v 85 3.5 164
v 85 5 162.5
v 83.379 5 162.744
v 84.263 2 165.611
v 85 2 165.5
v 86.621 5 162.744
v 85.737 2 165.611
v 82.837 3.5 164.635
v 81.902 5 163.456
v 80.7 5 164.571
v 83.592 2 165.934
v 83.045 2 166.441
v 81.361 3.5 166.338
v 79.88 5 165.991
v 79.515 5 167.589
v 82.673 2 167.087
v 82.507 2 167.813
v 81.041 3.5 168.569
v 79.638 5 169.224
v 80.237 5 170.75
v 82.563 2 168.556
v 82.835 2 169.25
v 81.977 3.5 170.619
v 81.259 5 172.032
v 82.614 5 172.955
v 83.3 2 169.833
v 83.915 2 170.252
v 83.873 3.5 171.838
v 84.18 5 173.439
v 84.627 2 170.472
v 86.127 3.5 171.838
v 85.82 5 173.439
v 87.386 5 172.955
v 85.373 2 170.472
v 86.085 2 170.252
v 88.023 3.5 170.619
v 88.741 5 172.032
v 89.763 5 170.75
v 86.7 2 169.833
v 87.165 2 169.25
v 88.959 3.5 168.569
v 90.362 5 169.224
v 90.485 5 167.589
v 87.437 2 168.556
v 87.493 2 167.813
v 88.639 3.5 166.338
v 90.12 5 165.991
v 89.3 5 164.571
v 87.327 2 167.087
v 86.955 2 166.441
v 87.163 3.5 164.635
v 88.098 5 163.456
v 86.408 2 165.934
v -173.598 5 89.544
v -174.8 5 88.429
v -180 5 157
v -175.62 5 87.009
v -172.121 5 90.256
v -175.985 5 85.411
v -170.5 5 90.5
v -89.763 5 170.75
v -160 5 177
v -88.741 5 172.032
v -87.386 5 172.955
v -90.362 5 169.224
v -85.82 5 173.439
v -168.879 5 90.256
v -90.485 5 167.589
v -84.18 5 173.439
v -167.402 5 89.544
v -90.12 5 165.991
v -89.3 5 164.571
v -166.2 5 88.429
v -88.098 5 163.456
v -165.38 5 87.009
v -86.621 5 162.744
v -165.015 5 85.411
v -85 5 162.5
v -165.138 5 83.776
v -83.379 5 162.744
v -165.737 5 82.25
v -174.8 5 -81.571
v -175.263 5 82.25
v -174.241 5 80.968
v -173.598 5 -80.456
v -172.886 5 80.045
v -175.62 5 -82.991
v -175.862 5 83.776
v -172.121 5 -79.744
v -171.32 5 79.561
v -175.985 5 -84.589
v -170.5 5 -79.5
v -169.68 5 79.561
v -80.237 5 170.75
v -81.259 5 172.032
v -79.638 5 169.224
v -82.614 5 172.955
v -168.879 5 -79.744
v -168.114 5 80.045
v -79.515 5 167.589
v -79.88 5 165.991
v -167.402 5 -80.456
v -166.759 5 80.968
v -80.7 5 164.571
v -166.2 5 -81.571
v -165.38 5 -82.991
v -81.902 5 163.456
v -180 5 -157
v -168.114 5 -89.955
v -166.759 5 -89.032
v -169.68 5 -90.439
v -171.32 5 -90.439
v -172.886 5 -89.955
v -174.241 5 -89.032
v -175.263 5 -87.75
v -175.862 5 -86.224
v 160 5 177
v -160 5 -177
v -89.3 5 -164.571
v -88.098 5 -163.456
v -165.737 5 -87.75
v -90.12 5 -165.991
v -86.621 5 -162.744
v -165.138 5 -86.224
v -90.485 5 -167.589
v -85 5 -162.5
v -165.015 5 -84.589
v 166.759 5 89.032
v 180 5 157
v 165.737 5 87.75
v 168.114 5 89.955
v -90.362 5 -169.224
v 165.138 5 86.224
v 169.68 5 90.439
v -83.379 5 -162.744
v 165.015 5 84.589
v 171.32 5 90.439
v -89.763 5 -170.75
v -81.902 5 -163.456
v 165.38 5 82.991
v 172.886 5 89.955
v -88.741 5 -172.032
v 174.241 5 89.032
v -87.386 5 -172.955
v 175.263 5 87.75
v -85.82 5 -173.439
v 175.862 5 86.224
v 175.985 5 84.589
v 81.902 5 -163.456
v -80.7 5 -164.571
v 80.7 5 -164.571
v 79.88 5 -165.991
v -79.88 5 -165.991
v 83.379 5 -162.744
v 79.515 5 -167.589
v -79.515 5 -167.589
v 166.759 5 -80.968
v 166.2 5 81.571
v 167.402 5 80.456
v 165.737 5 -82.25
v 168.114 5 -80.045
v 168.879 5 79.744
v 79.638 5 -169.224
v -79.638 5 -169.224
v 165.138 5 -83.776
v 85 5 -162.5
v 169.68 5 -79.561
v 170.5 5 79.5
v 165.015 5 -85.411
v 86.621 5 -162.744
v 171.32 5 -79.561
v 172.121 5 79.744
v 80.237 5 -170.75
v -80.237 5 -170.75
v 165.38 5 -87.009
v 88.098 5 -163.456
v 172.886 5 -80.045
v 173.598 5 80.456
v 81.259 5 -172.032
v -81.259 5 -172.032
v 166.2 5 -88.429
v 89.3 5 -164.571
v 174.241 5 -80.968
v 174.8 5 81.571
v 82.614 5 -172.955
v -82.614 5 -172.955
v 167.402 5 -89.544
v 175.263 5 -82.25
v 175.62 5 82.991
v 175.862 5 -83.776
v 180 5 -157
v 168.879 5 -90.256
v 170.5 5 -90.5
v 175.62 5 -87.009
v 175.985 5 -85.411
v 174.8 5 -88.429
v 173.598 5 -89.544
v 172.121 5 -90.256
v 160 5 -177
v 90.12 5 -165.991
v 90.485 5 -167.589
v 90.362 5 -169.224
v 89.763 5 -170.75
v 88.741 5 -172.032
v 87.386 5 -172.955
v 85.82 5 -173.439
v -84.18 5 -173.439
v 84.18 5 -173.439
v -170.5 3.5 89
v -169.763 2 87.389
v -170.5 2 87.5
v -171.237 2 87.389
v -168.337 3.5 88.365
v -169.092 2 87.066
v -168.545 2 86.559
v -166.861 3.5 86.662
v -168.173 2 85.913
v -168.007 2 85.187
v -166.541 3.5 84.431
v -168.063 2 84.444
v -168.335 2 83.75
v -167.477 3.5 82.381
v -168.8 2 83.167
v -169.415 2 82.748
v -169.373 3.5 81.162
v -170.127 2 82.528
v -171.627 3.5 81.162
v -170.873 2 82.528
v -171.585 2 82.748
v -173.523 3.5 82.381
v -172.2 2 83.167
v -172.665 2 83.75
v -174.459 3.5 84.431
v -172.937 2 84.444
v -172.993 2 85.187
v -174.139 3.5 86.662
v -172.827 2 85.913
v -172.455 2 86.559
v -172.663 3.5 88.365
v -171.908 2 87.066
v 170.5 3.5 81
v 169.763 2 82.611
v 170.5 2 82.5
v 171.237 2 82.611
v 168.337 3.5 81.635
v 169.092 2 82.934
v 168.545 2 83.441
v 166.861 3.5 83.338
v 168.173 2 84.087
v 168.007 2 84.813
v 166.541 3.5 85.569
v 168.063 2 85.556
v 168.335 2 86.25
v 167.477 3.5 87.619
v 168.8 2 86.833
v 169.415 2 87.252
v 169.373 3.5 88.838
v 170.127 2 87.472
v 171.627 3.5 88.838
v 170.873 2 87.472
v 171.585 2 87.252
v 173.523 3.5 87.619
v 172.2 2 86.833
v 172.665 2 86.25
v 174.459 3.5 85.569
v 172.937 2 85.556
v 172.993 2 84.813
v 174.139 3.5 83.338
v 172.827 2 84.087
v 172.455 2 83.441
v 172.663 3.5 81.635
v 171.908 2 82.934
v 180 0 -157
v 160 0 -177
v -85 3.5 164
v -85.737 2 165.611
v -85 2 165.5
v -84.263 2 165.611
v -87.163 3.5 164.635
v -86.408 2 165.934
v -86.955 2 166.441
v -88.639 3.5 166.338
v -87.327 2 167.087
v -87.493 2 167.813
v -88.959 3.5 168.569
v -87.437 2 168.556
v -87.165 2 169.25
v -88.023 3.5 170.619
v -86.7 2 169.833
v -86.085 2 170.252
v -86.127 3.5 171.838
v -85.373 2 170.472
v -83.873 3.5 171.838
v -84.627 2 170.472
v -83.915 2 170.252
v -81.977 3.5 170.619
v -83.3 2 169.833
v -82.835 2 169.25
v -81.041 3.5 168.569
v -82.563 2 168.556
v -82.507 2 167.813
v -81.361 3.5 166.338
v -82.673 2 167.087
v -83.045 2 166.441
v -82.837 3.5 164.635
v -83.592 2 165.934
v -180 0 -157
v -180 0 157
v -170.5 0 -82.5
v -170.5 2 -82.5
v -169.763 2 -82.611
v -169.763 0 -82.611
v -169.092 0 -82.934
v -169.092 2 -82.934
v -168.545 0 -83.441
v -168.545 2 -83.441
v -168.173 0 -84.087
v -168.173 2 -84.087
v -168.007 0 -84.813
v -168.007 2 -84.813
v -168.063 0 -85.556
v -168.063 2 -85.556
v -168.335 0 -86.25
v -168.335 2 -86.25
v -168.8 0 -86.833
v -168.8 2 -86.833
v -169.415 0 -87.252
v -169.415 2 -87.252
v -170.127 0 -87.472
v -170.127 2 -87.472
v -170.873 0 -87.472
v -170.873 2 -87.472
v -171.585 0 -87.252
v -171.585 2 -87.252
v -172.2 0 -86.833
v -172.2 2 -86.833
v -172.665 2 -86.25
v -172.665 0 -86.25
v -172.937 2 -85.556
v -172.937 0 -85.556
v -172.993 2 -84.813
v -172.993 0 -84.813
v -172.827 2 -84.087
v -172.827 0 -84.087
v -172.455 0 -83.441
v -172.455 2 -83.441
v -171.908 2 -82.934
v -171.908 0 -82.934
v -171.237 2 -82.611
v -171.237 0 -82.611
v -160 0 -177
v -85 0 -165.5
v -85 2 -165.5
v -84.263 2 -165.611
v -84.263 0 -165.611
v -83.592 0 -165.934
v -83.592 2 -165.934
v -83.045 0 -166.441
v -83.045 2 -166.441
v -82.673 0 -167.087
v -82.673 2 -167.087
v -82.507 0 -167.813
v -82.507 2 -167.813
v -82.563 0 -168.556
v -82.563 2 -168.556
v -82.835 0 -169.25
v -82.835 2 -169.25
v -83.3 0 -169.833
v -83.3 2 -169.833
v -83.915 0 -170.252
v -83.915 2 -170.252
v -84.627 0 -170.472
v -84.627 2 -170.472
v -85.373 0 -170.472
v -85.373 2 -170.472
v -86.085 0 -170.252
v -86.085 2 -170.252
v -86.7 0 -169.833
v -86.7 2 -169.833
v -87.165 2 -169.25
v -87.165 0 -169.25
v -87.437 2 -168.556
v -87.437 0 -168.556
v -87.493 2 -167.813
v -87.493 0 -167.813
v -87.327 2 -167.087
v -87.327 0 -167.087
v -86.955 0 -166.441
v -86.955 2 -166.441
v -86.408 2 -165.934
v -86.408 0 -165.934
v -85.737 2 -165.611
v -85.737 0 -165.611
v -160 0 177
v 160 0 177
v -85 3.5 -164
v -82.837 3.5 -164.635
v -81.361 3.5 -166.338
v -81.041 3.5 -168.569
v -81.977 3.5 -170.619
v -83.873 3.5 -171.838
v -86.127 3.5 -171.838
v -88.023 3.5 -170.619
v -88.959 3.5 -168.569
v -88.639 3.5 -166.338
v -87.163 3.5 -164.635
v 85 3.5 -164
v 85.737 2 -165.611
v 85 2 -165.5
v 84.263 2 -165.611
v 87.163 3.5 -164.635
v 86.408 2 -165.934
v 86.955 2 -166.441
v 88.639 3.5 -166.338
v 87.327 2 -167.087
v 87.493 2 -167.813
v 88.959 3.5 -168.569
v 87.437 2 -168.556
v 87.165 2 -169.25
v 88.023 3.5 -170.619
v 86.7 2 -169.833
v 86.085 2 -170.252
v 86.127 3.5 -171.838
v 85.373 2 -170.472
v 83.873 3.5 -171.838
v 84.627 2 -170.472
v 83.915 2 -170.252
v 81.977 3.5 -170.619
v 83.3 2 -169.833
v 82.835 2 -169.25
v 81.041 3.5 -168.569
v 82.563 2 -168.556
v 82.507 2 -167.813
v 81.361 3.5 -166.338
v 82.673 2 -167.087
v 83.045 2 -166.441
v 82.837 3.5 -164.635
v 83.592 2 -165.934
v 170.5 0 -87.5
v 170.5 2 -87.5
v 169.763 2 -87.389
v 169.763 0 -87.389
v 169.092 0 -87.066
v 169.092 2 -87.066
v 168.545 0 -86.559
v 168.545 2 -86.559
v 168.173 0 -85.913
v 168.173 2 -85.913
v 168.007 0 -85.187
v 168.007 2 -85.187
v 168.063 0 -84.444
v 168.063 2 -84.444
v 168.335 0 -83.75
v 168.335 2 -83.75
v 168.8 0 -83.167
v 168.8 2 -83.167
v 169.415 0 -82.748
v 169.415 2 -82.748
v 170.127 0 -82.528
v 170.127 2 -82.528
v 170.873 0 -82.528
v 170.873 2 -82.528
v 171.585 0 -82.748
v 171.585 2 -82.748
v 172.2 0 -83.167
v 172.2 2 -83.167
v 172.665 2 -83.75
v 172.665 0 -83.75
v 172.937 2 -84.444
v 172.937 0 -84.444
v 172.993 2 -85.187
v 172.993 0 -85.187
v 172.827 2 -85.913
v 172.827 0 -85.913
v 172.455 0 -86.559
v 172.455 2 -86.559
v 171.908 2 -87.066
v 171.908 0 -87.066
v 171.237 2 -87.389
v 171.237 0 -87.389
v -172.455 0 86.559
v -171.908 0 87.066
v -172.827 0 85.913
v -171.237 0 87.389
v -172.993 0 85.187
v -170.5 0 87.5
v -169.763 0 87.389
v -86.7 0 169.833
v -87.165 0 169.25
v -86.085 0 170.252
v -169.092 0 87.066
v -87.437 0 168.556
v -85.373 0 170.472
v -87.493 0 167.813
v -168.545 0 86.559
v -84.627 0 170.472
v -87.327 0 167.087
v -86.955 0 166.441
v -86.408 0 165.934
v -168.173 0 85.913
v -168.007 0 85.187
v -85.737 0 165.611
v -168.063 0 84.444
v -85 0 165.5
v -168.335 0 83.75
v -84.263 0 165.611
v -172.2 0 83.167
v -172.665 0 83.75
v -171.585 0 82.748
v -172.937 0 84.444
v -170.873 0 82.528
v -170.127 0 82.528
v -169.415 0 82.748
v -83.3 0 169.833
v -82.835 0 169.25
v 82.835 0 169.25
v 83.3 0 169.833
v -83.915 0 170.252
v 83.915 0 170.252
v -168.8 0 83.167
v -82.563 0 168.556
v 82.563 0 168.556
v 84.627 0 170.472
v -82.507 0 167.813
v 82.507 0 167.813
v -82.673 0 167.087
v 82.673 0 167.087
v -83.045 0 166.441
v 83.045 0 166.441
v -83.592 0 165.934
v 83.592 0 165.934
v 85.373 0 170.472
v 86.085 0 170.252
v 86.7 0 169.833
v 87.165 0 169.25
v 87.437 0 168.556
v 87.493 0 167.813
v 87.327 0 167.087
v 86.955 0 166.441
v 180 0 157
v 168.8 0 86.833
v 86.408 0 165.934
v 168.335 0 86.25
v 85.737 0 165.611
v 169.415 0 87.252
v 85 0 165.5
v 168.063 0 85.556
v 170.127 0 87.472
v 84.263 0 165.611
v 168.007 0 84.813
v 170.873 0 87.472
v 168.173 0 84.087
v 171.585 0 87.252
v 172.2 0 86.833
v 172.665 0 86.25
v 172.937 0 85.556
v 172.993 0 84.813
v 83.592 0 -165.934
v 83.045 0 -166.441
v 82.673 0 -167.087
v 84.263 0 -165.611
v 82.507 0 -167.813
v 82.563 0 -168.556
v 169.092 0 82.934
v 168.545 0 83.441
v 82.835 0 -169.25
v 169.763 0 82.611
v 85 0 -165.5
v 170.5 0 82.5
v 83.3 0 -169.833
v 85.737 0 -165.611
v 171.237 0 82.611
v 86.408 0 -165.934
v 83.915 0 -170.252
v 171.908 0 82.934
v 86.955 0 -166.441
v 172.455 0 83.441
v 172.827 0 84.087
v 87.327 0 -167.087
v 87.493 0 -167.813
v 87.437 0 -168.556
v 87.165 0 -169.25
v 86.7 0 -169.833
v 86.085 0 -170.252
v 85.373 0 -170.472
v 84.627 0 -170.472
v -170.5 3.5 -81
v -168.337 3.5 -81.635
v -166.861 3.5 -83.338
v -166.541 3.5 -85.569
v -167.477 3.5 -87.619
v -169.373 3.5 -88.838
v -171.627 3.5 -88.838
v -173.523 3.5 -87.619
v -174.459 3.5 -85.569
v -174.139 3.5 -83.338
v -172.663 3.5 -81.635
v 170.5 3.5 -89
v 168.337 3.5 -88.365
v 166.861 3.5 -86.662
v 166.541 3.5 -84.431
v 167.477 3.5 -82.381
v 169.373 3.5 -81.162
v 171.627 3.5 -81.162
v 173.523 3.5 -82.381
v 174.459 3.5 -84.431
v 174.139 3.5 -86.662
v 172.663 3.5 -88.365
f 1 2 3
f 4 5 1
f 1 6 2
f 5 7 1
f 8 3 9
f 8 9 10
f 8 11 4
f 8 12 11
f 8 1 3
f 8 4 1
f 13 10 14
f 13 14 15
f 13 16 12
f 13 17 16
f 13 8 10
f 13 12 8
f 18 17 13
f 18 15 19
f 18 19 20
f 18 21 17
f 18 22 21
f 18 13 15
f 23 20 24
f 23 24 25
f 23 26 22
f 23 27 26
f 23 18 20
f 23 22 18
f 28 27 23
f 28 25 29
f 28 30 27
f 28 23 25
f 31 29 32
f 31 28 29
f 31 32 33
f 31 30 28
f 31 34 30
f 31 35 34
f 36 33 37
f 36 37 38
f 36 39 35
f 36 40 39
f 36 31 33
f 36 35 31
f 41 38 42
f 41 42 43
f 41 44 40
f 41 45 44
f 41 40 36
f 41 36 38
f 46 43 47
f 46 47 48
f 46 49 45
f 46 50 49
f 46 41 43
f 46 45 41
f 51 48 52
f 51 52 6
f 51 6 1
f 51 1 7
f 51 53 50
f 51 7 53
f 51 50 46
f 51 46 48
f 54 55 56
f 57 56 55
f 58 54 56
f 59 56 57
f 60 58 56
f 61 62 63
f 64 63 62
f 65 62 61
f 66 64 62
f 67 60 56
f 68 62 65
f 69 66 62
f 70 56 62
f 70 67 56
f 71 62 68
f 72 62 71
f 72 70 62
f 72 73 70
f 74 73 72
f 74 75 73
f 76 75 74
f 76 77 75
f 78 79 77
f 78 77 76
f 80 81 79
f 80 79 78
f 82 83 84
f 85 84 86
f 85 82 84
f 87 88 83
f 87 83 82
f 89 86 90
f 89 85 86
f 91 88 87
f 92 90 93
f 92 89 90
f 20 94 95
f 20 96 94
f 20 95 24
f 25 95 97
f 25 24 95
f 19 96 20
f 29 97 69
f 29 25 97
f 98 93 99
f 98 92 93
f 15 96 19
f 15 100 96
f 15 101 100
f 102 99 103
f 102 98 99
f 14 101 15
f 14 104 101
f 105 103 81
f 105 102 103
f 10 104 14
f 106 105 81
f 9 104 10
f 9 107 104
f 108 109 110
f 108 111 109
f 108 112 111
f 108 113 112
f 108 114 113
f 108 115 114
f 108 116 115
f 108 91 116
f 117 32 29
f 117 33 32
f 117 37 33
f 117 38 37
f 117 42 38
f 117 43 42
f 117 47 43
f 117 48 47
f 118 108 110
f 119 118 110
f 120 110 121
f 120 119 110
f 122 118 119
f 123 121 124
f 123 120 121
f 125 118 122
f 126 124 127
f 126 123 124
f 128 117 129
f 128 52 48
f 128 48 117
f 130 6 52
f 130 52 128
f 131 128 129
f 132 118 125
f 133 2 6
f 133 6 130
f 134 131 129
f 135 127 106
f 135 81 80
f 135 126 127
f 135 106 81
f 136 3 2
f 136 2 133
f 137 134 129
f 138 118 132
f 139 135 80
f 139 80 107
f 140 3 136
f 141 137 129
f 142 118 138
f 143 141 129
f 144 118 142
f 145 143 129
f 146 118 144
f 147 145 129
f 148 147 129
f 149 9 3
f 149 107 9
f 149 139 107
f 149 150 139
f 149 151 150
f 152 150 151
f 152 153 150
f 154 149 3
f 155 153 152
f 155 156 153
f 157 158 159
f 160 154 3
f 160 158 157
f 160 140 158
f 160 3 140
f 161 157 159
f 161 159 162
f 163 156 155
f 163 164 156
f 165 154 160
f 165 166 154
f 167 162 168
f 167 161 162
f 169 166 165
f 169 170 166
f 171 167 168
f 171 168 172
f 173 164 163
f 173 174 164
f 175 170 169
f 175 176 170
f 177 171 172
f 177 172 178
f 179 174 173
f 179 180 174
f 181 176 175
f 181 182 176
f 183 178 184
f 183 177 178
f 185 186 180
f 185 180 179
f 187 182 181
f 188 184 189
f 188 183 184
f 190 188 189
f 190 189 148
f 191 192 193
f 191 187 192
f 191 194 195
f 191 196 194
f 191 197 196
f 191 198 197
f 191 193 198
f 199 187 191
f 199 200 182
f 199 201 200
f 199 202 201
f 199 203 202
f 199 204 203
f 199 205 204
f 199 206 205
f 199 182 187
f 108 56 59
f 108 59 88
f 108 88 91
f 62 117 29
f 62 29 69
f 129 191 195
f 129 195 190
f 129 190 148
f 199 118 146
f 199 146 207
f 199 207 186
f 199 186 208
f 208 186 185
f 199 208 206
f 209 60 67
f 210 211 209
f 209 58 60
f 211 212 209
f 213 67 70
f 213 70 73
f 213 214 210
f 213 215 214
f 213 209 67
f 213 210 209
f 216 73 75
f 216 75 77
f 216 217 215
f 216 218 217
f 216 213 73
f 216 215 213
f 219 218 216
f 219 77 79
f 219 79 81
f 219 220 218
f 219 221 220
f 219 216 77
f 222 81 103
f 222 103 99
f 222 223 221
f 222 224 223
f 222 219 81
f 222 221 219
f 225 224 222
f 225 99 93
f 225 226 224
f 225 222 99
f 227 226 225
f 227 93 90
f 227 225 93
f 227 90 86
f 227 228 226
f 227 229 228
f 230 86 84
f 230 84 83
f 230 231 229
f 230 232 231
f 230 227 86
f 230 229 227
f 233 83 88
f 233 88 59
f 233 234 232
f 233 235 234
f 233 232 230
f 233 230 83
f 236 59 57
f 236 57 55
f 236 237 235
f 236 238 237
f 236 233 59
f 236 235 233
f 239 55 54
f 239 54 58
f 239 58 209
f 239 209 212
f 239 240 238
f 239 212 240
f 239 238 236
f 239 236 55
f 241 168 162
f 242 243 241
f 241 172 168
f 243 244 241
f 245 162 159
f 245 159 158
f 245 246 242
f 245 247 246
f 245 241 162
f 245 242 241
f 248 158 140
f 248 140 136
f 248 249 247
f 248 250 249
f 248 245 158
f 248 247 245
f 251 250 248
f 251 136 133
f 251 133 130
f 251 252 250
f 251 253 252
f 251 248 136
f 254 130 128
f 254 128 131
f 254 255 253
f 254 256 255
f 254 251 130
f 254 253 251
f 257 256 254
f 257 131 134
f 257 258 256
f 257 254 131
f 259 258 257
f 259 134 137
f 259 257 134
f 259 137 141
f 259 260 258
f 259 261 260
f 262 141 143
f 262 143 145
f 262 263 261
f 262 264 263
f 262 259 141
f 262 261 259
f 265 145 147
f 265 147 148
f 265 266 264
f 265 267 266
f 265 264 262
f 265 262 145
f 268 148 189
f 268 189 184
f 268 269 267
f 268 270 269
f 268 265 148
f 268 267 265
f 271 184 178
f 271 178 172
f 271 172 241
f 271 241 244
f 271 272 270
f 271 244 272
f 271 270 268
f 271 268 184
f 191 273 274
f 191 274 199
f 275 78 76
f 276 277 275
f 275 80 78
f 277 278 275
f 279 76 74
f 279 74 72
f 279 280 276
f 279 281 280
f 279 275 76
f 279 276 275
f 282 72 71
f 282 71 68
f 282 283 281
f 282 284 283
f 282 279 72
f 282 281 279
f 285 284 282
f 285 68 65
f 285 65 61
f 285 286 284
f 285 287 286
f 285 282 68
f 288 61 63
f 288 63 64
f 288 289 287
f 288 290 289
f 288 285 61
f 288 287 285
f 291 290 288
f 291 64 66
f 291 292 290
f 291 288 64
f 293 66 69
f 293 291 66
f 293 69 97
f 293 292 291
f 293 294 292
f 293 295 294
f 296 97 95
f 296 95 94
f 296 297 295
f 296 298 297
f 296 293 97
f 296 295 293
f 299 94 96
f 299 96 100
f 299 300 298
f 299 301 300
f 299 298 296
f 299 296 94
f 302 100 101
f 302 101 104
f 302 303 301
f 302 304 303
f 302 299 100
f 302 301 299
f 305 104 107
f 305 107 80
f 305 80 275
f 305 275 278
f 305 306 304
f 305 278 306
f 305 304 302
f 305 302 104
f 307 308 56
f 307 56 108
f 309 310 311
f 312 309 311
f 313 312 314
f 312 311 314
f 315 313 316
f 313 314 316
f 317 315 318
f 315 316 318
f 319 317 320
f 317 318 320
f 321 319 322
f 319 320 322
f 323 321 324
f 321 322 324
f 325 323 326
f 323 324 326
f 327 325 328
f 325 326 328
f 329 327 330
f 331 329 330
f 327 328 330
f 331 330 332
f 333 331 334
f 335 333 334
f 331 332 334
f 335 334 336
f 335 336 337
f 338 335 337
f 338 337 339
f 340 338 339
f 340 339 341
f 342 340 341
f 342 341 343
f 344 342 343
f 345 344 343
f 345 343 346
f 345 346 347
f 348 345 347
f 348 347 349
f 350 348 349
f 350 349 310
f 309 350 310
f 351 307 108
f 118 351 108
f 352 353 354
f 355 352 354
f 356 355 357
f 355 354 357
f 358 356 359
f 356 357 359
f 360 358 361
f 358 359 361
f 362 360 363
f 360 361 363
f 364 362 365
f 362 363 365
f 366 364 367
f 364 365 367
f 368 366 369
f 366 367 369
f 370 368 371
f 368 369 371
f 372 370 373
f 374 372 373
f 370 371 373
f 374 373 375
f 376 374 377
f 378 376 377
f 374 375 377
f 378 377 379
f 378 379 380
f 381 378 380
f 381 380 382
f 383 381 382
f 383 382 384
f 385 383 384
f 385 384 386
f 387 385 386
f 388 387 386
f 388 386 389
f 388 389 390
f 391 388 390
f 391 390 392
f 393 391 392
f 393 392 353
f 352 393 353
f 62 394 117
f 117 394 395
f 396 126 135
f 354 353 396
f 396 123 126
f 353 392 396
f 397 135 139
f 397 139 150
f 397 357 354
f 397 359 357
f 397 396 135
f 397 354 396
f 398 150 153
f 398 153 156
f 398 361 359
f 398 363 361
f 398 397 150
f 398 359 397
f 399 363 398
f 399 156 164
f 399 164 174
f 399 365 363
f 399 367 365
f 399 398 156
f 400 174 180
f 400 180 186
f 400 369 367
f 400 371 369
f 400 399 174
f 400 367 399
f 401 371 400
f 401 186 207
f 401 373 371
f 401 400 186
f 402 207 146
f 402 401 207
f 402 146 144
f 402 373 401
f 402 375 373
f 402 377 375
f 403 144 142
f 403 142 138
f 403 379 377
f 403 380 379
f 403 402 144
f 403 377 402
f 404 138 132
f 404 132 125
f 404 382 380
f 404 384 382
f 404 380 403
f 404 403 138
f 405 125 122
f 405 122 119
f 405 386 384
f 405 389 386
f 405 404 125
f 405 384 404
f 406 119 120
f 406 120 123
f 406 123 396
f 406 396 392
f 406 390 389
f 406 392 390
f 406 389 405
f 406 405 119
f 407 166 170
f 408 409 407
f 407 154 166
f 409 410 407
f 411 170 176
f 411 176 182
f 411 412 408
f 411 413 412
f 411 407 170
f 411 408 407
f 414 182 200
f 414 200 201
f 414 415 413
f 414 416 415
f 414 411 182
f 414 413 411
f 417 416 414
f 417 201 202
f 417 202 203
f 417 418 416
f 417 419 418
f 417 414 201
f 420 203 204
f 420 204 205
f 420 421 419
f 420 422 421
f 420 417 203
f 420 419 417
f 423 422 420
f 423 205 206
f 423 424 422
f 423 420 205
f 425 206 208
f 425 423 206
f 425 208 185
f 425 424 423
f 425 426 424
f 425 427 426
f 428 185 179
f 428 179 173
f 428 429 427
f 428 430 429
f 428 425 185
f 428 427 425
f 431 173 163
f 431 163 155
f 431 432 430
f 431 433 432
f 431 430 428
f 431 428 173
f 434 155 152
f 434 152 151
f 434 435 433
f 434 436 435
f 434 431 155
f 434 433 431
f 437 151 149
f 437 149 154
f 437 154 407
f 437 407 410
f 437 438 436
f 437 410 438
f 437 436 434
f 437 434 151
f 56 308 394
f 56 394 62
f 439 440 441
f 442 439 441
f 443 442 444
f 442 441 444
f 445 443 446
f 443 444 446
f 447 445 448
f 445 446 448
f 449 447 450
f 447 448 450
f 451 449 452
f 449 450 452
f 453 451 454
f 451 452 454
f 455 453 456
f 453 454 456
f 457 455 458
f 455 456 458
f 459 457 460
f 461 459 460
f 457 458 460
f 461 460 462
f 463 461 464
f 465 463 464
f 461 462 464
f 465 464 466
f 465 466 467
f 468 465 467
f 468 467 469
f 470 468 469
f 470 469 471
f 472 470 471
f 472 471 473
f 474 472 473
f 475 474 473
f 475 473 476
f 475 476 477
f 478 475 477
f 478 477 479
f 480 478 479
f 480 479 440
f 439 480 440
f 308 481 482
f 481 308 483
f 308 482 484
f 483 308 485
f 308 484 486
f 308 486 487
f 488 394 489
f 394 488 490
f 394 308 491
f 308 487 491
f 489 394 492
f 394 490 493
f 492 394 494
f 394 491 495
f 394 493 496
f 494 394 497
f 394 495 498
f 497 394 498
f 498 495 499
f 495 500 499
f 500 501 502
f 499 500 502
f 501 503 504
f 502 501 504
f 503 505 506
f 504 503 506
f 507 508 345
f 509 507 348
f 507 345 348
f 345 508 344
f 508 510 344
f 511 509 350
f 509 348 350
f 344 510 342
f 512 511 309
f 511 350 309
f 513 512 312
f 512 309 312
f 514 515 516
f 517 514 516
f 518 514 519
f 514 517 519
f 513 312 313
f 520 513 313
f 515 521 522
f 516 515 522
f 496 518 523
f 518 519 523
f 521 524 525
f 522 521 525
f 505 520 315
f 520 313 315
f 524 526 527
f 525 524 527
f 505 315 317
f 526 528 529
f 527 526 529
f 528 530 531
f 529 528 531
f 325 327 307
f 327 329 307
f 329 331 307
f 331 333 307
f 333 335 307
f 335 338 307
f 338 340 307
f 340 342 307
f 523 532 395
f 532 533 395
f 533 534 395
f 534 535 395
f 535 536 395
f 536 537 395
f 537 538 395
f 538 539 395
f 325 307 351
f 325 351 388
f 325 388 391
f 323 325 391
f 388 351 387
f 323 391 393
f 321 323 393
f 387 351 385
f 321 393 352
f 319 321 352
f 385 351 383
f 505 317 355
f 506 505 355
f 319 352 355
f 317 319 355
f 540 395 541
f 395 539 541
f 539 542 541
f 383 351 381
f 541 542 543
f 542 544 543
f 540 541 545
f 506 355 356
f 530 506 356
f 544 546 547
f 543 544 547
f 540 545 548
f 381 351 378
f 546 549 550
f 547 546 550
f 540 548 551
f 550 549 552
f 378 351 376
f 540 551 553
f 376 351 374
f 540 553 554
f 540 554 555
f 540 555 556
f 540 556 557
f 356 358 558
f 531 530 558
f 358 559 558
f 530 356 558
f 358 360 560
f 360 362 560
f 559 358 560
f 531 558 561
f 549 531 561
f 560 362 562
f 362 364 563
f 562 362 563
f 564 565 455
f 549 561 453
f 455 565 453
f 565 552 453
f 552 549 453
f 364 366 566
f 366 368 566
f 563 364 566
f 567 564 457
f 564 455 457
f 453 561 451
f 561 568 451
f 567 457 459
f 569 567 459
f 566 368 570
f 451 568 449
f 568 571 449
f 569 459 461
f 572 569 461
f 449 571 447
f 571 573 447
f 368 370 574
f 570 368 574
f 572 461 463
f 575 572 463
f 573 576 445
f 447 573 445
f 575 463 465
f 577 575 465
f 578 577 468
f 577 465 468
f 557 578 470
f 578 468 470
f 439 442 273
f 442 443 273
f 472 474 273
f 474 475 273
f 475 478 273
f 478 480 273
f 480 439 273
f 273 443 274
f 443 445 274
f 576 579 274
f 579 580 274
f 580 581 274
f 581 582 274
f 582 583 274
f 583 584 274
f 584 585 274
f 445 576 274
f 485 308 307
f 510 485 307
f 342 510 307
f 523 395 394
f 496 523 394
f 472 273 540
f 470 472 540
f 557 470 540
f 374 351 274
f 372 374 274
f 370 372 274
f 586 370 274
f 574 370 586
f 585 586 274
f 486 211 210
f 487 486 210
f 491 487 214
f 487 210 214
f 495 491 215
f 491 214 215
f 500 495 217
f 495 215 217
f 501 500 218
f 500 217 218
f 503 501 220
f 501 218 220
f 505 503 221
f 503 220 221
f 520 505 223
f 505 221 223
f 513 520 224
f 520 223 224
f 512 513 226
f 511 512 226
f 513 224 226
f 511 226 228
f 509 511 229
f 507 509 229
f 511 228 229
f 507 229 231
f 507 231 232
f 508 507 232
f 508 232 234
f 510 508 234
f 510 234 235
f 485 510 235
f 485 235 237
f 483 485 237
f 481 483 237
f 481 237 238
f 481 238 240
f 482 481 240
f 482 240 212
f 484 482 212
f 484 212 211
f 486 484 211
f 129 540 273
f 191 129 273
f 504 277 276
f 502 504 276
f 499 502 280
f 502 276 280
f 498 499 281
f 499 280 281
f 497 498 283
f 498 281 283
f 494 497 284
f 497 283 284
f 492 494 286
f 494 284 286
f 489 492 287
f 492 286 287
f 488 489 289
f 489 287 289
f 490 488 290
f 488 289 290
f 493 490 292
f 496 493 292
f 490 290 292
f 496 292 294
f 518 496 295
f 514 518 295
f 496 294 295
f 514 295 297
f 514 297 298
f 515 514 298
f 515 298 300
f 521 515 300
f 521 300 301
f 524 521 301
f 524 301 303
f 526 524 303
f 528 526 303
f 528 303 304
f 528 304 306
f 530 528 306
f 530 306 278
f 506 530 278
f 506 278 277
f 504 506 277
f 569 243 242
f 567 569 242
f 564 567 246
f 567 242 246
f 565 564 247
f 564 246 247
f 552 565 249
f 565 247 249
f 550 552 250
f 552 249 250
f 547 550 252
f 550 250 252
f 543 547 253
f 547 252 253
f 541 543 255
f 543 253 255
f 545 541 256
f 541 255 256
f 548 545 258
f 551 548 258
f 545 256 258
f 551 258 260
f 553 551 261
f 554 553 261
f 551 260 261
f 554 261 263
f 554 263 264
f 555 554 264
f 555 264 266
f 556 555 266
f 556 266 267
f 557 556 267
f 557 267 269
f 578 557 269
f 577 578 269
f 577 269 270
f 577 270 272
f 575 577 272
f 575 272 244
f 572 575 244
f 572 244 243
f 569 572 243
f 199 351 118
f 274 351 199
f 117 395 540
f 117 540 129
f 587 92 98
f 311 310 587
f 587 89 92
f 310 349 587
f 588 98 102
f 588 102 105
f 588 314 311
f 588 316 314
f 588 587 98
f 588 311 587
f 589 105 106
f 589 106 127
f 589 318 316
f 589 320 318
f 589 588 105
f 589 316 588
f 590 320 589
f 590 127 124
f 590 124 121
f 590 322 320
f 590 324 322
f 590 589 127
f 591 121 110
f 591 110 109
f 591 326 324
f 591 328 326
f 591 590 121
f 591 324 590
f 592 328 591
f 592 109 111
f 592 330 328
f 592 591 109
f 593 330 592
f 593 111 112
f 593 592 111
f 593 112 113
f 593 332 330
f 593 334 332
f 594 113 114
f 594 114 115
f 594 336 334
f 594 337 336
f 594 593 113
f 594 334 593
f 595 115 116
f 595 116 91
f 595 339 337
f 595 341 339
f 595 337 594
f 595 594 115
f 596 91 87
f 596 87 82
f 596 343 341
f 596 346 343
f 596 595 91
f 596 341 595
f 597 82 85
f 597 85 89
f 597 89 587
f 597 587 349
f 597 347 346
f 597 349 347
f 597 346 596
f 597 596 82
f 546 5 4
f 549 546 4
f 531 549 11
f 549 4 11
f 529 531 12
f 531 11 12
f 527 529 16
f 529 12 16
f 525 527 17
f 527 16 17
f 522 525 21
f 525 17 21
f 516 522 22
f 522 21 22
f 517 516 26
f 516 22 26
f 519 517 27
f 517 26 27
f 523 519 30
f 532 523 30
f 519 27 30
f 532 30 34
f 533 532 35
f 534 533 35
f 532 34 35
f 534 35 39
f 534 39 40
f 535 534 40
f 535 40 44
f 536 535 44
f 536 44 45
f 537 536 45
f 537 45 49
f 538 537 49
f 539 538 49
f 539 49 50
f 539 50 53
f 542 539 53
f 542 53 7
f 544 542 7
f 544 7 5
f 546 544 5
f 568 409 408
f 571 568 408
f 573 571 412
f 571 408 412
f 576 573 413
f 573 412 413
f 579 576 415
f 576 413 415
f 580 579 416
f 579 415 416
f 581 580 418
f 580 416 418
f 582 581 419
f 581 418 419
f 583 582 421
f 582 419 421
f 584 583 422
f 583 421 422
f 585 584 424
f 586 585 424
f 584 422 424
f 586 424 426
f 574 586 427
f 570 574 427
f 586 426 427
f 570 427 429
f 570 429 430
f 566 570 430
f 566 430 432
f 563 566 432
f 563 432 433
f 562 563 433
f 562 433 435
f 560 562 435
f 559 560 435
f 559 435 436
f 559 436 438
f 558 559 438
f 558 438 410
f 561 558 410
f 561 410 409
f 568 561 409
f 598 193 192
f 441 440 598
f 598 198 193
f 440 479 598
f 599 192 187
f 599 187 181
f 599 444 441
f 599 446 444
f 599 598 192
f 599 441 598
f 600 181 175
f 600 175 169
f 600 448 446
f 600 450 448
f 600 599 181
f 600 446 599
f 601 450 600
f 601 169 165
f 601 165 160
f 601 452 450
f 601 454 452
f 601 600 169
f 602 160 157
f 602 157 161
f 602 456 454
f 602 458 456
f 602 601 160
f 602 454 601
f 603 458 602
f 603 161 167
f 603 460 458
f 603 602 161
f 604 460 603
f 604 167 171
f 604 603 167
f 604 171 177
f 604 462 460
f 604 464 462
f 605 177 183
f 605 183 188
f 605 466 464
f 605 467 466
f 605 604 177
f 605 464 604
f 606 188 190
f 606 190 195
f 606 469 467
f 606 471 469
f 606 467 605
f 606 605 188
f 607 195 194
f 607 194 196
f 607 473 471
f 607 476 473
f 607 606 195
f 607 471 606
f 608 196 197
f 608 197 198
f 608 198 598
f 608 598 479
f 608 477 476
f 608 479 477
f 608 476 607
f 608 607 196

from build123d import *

# Parameters (mm, degrees)
SKETCH_1_W         = 360
SKETCH_1_H         = 354
EXTRUDE_1_DEPTH    = 5
CHAMFER_1_SIZE     = 20
SKETCH1_R          = 2.5
CUT_EXTRUDE1_DEPTH = 10
CHAMFER1_SIZE      = 3


with BuildPart() as part:
    # Эскиз1 → Бобышка-Вытянуть1 (new body)
    with BuildSketch(Plane(origin=(0, 0, 0), x_dir=(1, 0, 0), z_dir=(0, 1, 0))):
        Rectangle(SKETCH_1_W, SKETCH_1_H)
    extrude(amount=EXTRUDE_1_DEPTH)

    # Фаска1
    chamfer_1_edges = [part.edges().sort_by_distance(p)[0] for p in [
        (-180, 2.5, -177),
        (180, 2.5, -177),
        (180, 2.5, 177),
        (-180, 2.5, 177),
    ]]
    chamfer(chamfer_1_edges, length=CHAMFER_1_SIZE)

    # Sketch1 → Cut-Extrude1 (cut)
    with BuildSketch(Plane(origin=(0, 5, 0), x_dir=(1, 0, 0), z_dir=(0, 1, 0))):
        with Locations(Location((85, -168, 0), (0, 0, 90))):
            Circle(SKETCH1_R)
        with Locations(Location((-85, -168, 0), (0, 0, 90))):
            Circle(SKETCH1_R)
        with Locations(Location((-170.5, -85, 0), (0, 0, 270))):
            Circle(SKETCH1_R)
        with Locations(Location((-170.5, 85, 0), (0, 0, 270))):
            Circle(SKETCH1_R)
        with Locations(Location((-85, 168, 0), (0, 0, 270))):
            Circle(SKETCH1_R)
        with Locations(Location((85, 168, 0), (0, 0, 270))):
            Circle(SKETCH1_R)
        with Locations(Location((170.5, 85, 0), (0, 0, 90))):
            Circle(SKETCH1_R)
        with Locations(Location((170.5, -85, 0), (0, 0, 90))):
            Circle(SKETCH1_R)
    extrude(amount=-CUT_EXTRUDE1_DEPTH, mode=Mode.SUBTRACT)

    # Chamfer1
    chamfer1_edges = [part.edges().sort_by_distance(p)[0] for p in [
        (85, 5, 170.5),
        (170.5, 5, 87.5),
        (170.5, 5, -82.5),
        (85, 5, -170.5),
        (-85, 5, -170.5),
        (-170.5, 5, -87.5),
        (-170.5, 5, 82.5),
        (-85, 5, 170.5),
    ]]
    chamfer(chamfer1_edges, length=CHAMFER1_SIZE)


solid = part.part
